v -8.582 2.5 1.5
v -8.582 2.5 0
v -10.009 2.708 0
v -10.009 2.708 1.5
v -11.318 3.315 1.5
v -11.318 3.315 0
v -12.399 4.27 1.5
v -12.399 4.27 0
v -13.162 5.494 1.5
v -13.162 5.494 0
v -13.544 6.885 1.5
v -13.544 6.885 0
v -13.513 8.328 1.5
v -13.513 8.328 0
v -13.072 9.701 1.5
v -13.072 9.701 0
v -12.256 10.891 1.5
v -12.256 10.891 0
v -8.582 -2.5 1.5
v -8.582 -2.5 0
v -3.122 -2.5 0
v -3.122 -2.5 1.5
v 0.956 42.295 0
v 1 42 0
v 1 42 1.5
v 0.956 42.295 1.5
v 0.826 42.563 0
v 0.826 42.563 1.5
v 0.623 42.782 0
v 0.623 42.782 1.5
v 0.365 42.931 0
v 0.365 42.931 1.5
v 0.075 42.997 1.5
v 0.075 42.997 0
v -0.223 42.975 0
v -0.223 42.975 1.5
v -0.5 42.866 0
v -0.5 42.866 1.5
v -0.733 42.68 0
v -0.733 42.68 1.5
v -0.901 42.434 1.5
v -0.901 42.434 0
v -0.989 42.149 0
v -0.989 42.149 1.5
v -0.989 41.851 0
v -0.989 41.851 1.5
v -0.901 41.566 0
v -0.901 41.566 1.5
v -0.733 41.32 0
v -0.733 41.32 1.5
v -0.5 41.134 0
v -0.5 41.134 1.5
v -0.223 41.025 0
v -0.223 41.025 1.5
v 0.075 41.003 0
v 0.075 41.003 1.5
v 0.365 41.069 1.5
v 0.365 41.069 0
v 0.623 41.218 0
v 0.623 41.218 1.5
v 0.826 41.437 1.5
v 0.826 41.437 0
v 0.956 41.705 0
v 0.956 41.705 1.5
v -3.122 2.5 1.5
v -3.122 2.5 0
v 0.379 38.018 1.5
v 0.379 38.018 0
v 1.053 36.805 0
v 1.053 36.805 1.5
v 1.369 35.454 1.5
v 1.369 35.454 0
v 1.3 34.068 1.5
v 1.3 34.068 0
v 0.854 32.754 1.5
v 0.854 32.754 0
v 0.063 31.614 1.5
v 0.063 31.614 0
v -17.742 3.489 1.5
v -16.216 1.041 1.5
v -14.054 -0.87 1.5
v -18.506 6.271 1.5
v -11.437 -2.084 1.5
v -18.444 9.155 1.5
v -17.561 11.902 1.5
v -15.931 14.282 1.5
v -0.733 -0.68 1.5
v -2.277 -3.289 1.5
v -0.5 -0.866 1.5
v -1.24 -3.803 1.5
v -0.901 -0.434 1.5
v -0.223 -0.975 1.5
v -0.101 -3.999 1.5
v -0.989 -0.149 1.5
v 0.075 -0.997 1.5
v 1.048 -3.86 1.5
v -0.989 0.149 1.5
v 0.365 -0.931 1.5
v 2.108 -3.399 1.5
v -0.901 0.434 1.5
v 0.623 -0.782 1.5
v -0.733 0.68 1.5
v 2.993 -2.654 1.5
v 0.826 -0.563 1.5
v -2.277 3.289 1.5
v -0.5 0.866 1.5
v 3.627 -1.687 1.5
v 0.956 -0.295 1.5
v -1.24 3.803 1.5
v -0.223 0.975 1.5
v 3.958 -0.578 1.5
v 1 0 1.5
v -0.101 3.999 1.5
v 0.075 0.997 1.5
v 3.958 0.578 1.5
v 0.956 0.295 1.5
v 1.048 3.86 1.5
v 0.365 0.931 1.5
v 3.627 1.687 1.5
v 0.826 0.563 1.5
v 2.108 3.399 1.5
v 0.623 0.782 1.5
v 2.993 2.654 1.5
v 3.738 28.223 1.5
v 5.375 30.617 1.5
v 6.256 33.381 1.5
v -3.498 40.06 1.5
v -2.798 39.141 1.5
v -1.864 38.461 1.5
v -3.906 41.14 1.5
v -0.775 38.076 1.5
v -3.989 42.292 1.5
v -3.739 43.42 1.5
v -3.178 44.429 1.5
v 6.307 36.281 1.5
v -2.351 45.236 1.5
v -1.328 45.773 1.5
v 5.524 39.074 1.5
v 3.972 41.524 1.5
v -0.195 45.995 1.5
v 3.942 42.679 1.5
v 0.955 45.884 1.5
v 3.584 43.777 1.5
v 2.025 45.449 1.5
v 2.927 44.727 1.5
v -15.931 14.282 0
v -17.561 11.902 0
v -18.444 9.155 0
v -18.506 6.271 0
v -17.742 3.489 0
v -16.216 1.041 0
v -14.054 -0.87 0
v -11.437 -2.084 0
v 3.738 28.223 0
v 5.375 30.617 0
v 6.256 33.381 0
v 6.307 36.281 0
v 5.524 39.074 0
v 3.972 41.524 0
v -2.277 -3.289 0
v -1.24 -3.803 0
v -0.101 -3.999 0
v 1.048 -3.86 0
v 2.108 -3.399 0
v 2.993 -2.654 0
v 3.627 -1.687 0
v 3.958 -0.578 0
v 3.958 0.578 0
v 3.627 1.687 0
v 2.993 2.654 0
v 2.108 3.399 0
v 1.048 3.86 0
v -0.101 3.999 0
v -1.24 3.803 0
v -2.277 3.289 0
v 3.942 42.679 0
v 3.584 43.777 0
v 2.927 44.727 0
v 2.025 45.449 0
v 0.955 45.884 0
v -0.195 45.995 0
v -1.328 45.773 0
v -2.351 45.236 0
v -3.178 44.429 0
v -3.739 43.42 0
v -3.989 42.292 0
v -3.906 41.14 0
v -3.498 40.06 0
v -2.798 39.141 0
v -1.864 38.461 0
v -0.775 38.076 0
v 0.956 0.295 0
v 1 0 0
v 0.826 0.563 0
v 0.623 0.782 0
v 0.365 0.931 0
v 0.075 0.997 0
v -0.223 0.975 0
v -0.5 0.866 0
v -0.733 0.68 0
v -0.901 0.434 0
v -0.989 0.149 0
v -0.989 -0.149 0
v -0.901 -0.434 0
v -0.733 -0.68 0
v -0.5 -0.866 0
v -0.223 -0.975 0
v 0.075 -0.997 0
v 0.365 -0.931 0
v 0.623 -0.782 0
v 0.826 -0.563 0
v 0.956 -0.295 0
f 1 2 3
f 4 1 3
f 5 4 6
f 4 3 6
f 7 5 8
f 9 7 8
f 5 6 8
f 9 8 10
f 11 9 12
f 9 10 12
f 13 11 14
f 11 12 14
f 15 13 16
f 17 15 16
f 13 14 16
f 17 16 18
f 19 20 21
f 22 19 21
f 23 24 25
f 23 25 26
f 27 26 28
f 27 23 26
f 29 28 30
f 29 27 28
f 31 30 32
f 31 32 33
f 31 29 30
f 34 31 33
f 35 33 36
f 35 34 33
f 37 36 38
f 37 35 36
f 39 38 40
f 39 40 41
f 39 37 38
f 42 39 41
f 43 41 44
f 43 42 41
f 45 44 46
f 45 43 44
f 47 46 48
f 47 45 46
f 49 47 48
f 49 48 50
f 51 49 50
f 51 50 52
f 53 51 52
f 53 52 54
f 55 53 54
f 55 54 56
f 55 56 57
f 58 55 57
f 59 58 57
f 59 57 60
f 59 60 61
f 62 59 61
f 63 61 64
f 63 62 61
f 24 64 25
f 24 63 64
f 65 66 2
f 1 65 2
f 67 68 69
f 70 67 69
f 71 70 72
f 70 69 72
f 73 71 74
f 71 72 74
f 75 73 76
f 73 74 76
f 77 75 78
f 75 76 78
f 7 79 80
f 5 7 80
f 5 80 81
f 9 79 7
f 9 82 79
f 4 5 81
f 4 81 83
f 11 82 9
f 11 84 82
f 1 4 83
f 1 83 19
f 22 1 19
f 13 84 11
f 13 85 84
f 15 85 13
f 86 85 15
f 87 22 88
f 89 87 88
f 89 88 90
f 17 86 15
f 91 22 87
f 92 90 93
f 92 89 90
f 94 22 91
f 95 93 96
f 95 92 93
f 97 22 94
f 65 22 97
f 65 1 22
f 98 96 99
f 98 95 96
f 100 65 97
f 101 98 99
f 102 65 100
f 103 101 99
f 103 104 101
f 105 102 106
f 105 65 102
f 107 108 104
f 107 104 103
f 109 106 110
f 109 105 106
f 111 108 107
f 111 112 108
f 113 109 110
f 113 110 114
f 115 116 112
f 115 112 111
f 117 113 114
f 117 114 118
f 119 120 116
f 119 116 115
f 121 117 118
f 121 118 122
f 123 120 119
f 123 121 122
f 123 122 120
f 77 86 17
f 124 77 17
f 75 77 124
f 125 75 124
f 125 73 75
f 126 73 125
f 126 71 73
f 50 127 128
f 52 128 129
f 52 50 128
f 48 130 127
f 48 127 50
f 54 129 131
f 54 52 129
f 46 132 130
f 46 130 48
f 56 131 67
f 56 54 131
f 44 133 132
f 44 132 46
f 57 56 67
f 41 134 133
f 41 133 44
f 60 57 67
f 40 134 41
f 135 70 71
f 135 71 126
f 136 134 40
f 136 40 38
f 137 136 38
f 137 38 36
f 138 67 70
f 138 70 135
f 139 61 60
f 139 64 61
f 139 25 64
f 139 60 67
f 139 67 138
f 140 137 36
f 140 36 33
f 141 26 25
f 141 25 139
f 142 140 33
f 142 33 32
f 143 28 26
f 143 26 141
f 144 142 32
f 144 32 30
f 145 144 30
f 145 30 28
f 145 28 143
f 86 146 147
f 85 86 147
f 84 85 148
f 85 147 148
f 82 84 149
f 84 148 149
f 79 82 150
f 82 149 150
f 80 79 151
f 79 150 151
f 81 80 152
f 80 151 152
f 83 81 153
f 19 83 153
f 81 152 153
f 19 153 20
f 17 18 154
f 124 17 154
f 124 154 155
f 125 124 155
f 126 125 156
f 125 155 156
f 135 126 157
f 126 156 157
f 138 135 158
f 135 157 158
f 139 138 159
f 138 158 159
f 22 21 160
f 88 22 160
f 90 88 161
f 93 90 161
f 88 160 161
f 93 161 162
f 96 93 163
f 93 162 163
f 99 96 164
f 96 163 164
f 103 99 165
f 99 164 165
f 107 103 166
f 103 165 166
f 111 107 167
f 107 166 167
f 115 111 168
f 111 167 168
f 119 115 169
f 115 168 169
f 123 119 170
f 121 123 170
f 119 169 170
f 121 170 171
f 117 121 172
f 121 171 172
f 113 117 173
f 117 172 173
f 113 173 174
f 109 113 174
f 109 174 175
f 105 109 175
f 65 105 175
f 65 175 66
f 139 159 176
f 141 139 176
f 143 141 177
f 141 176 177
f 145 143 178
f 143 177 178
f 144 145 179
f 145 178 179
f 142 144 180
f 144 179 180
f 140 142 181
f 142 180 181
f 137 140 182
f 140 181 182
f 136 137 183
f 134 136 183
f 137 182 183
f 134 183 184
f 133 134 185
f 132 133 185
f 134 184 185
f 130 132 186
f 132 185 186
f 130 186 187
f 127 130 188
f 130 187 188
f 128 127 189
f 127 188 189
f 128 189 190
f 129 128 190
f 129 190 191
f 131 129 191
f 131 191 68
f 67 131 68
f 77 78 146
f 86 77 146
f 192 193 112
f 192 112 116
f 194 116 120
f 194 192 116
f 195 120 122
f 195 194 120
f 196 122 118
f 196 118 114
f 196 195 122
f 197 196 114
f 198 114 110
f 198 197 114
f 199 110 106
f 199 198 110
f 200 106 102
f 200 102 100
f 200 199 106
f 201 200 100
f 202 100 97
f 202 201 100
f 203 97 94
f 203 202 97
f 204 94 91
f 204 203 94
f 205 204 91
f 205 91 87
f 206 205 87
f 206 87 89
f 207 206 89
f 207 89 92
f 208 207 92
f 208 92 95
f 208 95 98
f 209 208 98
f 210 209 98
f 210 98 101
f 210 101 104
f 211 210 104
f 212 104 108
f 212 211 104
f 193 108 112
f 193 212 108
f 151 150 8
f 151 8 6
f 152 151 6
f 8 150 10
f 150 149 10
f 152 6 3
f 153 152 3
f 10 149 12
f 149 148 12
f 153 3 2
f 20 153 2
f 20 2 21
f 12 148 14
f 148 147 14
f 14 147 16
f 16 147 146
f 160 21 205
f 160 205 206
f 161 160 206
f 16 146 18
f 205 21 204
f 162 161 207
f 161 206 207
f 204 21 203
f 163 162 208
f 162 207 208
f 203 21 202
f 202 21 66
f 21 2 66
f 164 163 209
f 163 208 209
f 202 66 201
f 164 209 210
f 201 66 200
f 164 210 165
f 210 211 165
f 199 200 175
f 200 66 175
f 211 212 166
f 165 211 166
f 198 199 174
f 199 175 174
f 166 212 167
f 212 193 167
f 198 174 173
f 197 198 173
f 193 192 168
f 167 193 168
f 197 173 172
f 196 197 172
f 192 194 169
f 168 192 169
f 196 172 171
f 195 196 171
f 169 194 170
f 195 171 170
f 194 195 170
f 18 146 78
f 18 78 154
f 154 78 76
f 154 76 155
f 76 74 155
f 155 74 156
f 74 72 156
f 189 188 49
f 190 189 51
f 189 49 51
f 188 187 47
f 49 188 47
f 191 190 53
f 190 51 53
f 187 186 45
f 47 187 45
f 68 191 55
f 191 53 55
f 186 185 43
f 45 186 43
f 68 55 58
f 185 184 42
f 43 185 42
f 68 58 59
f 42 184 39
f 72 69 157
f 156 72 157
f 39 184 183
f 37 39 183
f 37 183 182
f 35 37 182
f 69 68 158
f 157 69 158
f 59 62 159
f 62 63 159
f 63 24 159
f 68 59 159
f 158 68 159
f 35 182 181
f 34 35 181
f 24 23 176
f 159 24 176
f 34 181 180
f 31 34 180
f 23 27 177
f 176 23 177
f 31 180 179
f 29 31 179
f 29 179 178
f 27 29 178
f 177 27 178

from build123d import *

# Parameters (mm, degrees)
SKETCH1_R           = 1
BOSS_EXTRUDE1_DEPTH = 1.5


with BuildPart() as part:
    # Sketch1 → Boss-Extrude1 (new body)
    with BuildSketch(Plane.XY):
        with BuildLine():
            Line((-3.122498999, 2.5), (-8.582047484, 2.5))
            ThreePointArc((-8.582047484, 2.5), (-13.162149565, 5.494341772), (-12.256495253, 10.89093403))
            Line((-12.256495253, 10.89093403), (3.737859555, 28.222566206))
            ThreePointArc((3.737859555, 28.222566206), (6.38742077, 34.828756828), (3.971570907, 41.523949028))
            ThreePointArc((3.971570907, 41.523949028), (-2.793624676, 44.86280652), (0.378773293, 38.017974034))
            ThreePointArc((0.378773293, 38.017974034), (1.382913373, 34.75852813), (0.063411786, 31.613500235))
            Line((0.063411786, 31.613500235), (-15.930943021, 14.281868059))
            ThreePointArc((-15.930943021, 14.281868059), (-17.742251646, 3.488683545), (-8.582047484, -2.5))
            Line((-8.582047484, -2.5), (-3.122498999, -2.5))
            ThreePointArc((-3.122498999, -2.5), (4, 0), (-3.122498999, 2.5))
        make_face()
        Circle(SKETCH1_R, mode=Mode.SUBTRACT)
        with Locations((0, 42)):
            Circle(SKETCH1_R, mode=Mode.SUBTRACT)
    extrude(amount=BOSS_EXTRUDE1_DEPTH)


solid = part.part
